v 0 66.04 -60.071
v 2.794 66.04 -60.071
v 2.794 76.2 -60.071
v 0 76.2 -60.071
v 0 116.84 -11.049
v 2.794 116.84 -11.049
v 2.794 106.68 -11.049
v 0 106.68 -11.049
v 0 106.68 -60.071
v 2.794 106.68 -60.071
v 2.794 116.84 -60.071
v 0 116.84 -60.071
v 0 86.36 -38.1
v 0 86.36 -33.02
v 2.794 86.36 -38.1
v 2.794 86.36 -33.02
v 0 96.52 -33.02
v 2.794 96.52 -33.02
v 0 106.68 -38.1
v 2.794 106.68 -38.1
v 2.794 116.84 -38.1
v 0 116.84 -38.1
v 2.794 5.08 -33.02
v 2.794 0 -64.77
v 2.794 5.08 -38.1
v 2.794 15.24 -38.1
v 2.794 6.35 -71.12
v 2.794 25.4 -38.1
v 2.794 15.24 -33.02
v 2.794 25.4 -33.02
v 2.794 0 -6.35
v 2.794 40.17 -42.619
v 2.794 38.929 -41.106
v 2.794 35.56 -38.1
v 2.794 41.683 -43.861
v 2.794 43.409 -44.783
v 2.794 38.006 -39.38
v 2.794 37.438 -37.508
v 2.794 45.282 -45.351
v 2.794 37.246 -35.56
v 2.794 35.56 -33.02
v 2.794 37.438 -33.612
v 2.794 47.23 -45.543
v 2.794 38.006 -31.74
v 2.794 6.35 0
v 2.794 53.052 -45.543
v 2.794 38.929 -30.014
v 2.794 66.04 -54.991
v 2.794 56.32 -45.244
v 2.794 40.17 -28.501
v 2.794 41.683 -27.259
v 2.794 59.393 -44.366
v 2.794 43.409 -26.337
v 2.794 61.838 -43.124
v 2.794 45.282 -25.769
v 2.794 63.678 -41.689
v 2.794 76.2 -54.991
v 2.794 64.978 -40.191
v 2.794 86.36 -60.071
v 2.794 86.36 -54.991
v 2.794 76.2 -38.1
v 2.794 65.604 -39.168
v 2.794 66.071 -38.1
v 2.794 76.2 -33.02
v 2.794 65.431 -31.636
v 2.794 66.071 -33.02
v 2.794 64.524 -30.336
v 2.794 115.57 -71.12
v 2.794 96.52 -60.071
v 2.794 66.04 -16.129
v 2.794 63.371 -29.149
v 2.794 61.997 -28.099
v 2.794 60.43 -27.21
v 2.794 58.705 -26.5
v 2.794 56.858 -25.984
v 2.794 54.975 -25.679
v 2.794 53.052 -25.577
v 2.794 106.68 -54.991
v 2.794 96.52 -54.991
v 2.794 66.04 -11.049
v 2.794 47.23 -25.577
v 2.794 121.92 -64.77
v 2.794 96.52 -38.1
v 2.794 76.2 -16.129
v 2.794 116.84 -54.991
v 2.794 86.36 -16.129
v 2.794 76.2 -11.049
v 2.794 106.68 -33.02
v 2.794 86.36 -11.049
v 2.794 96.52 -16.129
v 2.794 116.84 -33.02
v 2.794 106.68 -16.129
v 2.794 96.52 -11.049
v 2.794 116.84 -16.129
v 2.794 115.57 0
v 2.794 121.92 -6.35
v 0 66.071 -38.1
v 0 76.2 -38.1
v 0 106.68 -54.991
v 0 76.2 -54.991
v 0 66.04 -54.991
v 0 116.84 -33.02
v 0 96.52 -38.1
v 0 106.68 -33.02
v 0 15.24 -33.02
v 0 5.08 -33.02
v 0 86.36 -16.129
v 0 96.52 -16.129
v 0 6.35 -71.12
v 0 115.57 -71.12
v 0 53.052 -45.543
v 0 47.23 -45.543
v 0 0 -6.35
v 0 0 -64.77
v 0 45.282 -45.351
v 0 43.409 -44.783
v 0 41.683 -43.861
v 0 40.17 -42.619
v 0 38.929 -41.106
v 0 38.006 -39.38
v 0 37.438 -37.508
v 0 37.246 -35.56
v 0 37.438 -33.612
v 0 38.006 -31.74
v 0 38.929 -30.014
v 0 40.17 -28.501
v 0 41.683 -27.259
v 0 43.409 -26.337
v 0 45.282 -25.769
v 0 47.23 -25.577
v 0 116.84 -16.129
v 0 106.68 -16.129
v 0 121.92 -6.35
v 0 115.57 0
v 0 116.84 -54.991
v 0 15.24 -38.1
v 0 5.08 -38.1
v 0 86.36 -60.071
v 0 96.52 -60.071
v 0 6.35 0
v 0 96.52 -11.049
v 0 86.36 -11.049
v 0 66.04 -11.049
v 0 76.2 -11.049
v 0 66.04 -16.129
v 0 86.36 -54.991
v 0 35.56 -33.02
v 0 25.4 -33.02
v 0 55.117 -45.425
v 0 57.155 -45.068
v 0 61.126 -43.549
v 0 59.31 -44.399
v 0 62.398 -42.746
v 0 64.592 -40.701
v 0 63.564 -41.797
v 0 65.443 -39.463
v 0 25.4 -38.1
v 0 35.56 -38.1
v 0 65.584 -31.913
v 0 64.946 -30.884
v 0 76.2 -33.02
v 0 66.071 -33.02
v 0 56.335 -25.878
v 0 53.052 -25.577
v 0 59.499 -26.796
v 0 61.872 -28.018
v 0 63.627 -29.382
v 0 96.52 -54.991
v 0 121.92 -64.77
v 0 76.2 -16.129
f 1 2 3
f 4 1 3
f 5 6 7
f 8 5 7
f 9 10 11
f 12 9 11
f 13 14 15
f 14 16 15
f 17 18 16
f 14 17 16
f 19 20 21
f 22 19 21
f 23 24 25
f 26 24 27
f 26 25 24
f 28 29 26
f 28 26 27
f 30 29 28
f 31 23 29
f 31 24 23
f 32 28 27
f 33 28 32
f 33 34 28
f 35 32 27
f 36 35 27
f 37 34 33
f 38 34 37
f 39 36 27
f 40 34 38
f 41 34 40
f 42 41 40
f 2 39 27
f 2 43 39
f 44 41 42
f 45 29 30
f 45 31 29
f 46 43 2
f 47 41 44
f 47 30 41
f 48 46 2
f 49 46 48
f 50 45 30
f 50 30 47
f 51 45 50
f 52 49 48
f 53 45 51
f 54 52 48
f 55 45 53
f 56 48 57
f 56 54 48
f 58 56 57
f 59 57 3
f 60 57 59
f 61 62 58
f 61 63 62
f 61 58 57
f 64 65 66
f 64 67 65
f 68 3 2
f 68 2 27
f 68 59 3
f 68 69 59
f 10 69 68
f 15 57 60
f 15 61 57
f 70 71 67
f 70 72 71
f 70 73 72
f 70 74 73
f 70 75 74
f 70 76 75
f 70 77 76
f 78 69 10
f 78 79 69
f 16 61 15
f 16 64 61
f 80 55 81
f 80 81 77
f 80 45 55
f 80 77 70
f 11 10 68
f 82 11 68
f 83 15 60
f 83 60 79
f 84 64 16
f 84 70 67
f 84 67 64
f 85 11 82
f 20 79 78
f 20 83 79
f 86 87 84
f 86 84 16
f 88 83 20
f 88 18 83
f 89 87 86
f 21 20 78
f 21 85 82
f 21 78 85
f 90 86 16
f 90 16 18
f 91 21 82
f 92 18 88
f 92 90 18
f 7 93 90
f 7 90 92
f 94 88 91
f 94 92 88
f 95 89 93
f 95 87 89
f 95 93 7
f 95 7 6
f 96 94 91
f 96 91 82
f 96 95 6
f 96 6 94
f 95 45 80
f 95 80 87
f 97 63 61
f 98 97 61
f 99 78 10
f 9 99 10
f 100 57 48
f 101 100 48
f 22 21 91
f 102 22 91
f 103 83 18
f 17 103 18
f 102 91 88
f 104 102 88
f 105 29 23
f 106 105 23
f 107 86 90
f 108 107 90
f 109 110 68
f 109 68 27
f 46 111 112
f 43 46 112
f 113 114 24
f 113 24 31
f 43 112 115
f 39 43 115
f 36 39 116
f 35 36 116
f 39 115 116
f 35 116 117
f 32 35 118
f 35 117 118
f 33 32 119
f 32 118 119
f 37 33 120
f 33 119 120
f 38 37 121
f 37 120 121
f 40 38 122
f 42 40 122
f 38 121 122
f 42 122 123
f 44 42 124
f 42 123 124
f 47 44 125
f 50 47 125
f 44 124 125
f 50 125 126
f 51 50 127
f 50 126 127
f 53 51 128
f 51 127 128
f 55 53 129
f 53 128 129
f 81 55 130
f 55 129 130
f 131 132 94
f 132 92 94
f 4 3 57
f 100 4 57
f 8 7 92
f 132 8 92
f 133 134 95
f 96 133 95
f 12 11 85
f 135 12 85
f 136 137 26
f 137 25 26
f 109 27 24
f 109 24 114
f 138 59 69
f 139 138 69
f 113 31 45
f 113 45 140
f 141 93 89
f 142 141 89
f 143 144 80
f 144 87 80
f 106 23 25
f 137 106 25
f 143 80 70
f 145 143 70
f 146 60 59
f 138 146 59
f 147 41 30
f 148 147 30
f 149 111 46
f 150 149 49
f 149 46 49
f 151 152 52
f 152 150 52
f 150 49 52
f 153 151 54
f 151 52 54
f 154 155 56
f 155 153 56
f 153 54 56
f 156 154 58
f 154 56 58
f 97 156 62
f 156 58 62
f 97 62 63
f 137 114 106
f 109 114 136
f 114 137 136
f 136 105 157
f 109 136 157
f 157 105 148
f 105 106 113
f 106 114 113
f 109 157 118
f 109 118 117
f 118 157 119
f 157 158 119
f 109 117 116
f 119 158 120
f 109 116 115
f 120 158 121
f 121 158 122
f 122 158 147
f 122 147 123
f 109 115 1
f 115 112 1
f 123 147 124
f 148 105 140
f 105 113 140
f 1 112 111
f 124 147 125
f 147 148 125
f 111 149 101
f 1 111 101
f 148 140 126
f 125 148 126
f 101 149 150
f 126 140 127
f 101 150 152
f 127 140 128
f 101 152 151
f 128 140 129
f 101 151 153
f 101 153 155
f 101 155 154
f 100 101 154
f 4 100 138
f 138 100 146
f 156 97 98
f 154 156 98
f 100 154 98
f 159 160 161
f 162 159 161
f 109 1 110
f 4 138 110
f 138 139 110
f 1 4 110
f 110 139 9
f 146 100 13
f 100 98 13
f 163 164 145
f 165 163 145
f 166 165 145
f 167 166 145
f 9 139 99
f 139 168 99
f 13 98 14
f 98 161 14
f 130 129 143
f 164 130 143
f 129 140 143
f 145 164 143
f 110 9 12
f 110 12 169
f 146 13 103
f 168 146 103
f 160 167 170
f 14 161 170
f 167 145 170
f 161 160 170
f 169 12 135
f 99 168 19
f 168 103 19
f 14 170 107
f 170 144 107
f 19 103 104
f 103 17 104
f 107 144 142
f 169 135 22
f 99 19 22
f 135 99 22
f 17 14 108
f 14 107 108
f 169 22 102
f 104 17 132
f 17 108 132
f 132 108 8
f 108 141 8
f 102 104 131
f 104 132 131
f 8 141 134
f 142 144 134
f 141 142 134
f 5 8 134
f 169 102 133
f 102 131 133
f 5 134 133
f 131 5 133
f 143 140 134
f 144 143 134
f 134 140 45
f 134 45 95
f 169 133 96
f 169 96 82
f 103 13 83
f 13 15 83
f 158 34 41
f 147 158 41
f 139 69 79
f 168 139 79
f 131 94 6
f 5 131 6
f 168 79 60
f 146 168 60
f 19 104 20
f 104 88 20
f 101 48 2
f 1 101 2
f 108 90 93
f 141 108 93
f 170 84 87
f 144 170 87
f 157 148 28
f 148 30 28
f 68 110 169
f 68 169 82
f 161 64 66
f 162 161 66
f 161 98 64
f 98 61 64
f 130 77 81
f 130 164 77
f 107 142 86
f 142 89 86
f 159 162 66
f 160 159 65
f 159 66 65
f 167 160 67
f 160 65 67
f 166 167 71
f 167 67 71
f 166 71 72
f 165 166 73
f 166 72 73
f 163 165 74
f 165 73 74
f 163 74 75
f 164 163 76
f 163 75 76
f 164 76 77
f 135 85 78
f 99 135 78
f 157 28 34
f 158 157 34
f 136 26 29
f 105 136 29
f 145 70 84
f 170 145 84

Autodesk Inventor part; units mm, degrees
ref_plane "YZ Plane" through (0, 0, 0) normal (1, 0, 0) x (0, 1, 0)
ref_plane "XZ Plane" through (0, 0, 0) normal (0, 1, 0) x (-1, 0, 0)
ref_plane "XY Plane" through (0, 0, 0) normal (0, 0, 1) x (1, 0, 0)
sketch "Sketch1" plane through (0, 0, 0) normal (1, 0, 0) x (0, 1, 0)
  line L0 (0, 0) -> (121.92, 0)
  line L1 (121.92, 0) -> (121.92, -71.12)
  line L2 (121.92, -71.12) -> (0, -71.12)
  line L3 (0, -71.12) -> (0, 0)
  dimension "d0" = 121.92
  dimension "d1" = 71.12
extrude "Extrusion1" add sketch "Sketch1" along normal blind 2.794
sketch "Sketch2" plane through (2.794, 0, 0) normal (1, 0, 0) x (0, 0, -1)
  line L0 (0, 121.92) -> (0, 0) projected
  line L1 (0, 0) -> (71.12, 0) projected
  line L2 (71.12, 0) -> (71.12, 121.92) projected
  line L3 (71.12, 121.92) -> (0, 121.92) projected
  line L4 (71.12, 121.92) -> (0, 121.92) construction
  line L5 (35.56, 121.92) -> (35.56, 0) construction
  line L6 (33.02, 5.08) -> (38.1, 5.08)
  line L7 (38.1, 5.08) -> (38.1, 15.24)
  line L8 (38.1, 15.24) -> (33.02, 15.24)
  line L9 (33.02, 15.24) -> (33.02, 5.08)
  line L10 (33.02, 25.4) -> (38.1, 25.4)
  line L11 (38.1, 25.4) -> (38.1, 35.56)
  line L12 (38.1, 35.56) -> (33.02, 35.56)
  line L13 (33.02, 35.56) -> (33.02, 25.4)
  line L14 (33.02, 45.72) -> (38.1, 45.72)
  line L15 (38.1, 45.72) -> (38.1, 55.88)
  line L16 (38.1, 55.88) -> (33.02, 55.88)
  line L17 (33.02, 55.88) -> (33.02, 45.72)
  line L18 (33.02, 66.04) -> (38.1, 66.04)
  line L19 (38.1, 66.04) -> (38.1, 76.2)
  line L20 (38.1, 76.2) -> (33.02, 76.2)
  line L21 (33.02, 76.2) -> (33.02, 66.04)
  line L22 (33.02, 86.36) -> (38.1, 86.36)
  line L23 (38.1, 86.36) -> (38.1, 96.52)
  line L24 (38.1, 96.52) -> (33.02, 96.52)
  line L25 (33.02, 96.52) -> (33.02, 86.36)
  line L26 (33.02, 106.68) -> (38.1, 106.68)
  line L27 (38.1, 106.68) -> (38.1, 116.84)
  line L28 (38.1, 116.84) -> (33.02, 116.84)
  line L29 (33.02, 116.84) -> (33.02, 106.68)
  line L30 (11.049, 86.36) -> (16.129, 86.36)
  line L31 (16.129, 86.36) -> (16.129, 96.52)
  line L32 (11.049, 96.52) -> (11.049, 86.36)
  line L33 (16.129, 96.52) -> (11.049, 96.52)
  line L34 (11.049, 106.68) -> (16.129, 106.68)
  line L35 (11.049, 116.84) -> (11.049, 106.68)
  line L36 (16.129, 106.68) -> (16.129, 116.84)
  line L37 (16.129, 116.84) -> (11.049, 116.84)
  line L38 (11.049, 66.04) -> (16.129, 66.04)
  line L39 (11.049, 76.2) -> (11.049, 66.04)
  line L40 (16.129, 66.04) -> (16.129, 76.2)
  line L41 (16.129, 76.2) -> (11.049, 76.2)
  line L42 (54.991, 86.36) -> (60.071, 86.36)
  line L43 (60.071, 86.36) -> (60.071, 96.52)
  line L44 (54.991, 96.52) -> (54.991, 86.36)
  line L45 (60.071, 96.52) -> (54.991, 96.52)
  line L46 (54.991, 106.68) -> (60.071, 106.68)
  line L47 (54.991, 116.84) -> (54.991, 106.68)
  line L48 (60.071, 106.68) -> (60.071, 116.84)
  line L49 (60.071, 116.84) -> (54.991, 116.84)
  line L50 (54.991, 66.04) -> (60.071, 66.04)
  line L51 (54.991, 76.2) -> (54.991, 66.04)
  line L52 (60.071, 66.04) -> (60.071, 76.2)
  line L53 (60.071, 76.2) -> (54.991, 76.2)
  line L54 (33.02, 86.36) -> (38.1, 86.36)
  line L55 (38.1, 86.36) -> (38.1, 96.52)
  line L56 (33.02, 96.52) -> (33.02, 86.36)
  line L57 (38.1, 96.52) -> (33.02, 96.52)
  line L58 (33.02, 106.68) -> (38.1, 106.68)
  line L59 (33.02, 116.84) -> (33.02, 106.68)
  line L60 (38.1, 106.68) -> (38.1, 116.84)
  line L61 (38.1, 116.84) -> (33.02, 116.84)
  line L62 (33.02, 66.04) -> (38.1, 66.04)
  line L63 (33.02, 76.2) -> (33.02, 66.04)
  line L64 (38.1, 66.04) -> (38.1, 76.2)
  line L65 (38.1, 76.2) -> (33.02, 76.2)
  point P0 (35.56, 15.24)
  point P1 (35.56, 35.56)
  point P2 (35.56, 55.88)
  point P3 (35.56, 76.2)
  point P4 (35.56, 96.52)
  point P5 (35.56, 116.84)
  point P6 (13.589, 96.52)
  point P7 (13.589, 116.84)
  point P8 (13.589, 76.2)
  point P9 (57.531, 96.52)
  point P10 (57.531, 116.84)
  point P11 (57.531, 76.2)
  point P12 (35.56, 96.52)
  point P13 (35.56, 116.84)
  point P14 (35.56, 76.2)
  dimension "d4" = 5.08
  dimension "d5" = 10.16
  dimension "d6" = 5.08
  dimension "d9" = 20.32
  dimension "d18" = 21.971
  dimension "d21" = 21.971
extrude "Extrusion2" cut sketch "Sketch2" against normal blind 25.4 contours L3 L2 L1 L0 | L32 L33 L31 L30 | L35 L37 L36 L34 | L39 L41 L40 L38 | L44 L45 L43 L42 | L47 L49 L48 L46 | L51 L53 L52 L50 keep common part
extrude "Extrusion3" cut sketch "Sketch2" against normal blind 25.4 keep common part
sketch "Sketch3" plane through (2.794, 0, 0) normal (1, 0, 0) x (0, 0, -1)
  ellipse E0 centre (35.56, 53.0414) end of major axis (35.56, 41.2576) minor radius 8.332 (40.2212, 62.8087) -> (30.9261, 62.8347) ccw construction
  spline S0 degree 3 poles (30.9261, 62.8347) (30.9327, 62.8286) (30.9386, 62.8221) (30.9557, 62.8007) (30.9663, 62.7802) (30.977, 62.7425) (30.9787, 62.7187) (30.9751, 62.672) (30.9665, 62.6409) (30.9201, 62.5239) (30.844, 62.4329) (30.6139, 62.201) (30.3871, 62.0485) (30.1451, 61.9341) (30.1067, 61.9173) (30.0669, 61.9017) knots 0.147565 0.147565 0.147565 0.147565 0.150034 0.150034 0.1558 0.1558 0.161773 0.161773 0.169845 0.169845 0.199517 0.199517 0.267842 0.267842 0.279835 0.279835 0.279835 0.279835 construction
  ellipse E1 centre (35.56, 53.0414) end of major axis (35.56, 41.2576) minor radius 8.332 (30.0669, 61.9017) -> (27.23, 53.3005) ccw construction
  spline S1 degree 3 poles (27.23, 53.3005) (27.2588, 53.2719) (27.2851, 53.2407) (27.334, 53.1732) (27.3565, 53.1364) (27.3764, 53.0984) knots -0.025032 -0.025032 -0.025032 -0.025032 -0.012859 -0.012859 0 0 0 0 construction
  spline S2 degree 3 poles (27.3764, 53.0984) (27.3563, 53.0613) (27.3336, 53.0254) (27.2841, 52.9599) (27.2576, 52.9297) (27.2286, 52.9024) knots -0.024627 -0.024627 -0.024627 -0.024627 -0.011976 -0.011976 -0.000005 -0.000005 -0.000005 -0.000005 construction
  ellipse E2 centre (35.56, 53.0414) end of major axis (35.56, 41.2576) minor radius 8.332 (27.2286, 52.9024) -> (27.2377, 52.473) ccw construction
  spline S3 degree 3 poles (27.2377, 52.473) (27.2678, 52.4474) (27.2955, 52.4189) (27.3478, 52.3562) (27.372, 52.3217) (27.3937, 52.2857) knots -0.024476 -0.024476 -0.024476 -0.024476 -0.012604 -0.012604 0 0 0 0 construction
  spline S4 degree 3 poles (27.3937, 52.2857) (27.3755, 52.2465) (27.3546, 52.2085) (27.3086, 52.1382) (27.2836, 52.1055) (27.256, 52.0754) knots -0.025198 -0.025198 -0.025198 -0.025198 -0.012267 -0.012267 -0.000005 -0.000005 -0.000005 -0.000005 construction
  ellipse E3 centre (35.56, 53.0414) end of major axis (35.56, 41.2576) minor radius 8.332 (27.256, 52.0754) -> (39.4571, 42.626) ccw construction
  spline S5 degree 3 poles (39.4571, 42.626) (39.4604, 42.6731) (39.4664, 42.7203) (39.4838, 42.8124) (39.4952, 42.8577) (39.5094, 42.902) knots -0.028123 -0.028123 -0.028123 -0.028123 -0.013949 -0.013949 0 0 0 0 construction
  spline S6 degree 3 poles (39.5094, 42.902) (39.5437, 42.8955) (39.577, 42.8851) (39.6424, 42.8569) (39.674, 42.839) (39.7037, 42.8182) knots -0.021367 -0.021367 -0.021367 -0.021367 -0.01089 -0.01089 -0.00001 -0.00001 -0.00001 -0.00001 construction
  ellipse E4 centre (35.56, 53.0414) end of major axis (35.56, 41.2576) minor radius 8.332 (39.7037, 42.8182) -> (39.9645, 43.0386) ccw construction
  spline S7 degree 3 poles (39.9645, 43.0386) (39.9654, 43.0862) (39.9691, 43.1338) (39.9819, 43.2275) (39.991, 43.274) (40.0029, 43.3195) knots -0.02838 -0.02838 -0.02838 -0.02838 -0.014121 -0.014121 0 0 0 0 construction
  spline S8 degree 3 poles (40.0029, 43.3195) (40.0373, 43.3164) (40.0711, 43.3093) (40.1378, 43.2875) (40.1703, 43.2728) (40.2011, 43.2549) knots -0.021052 -0.021052 -0.021052 -0.021052 -0.010689 -0.010689 -0.000009 -0.000009 -0.000009 -0.000009 construction
  ellipse E5 centre (35.56, 53.0414) end of major axis (35.56, 41.2576) minor radius 8.332 (40.2011, 43.2549) -> (41.1095, 61.8311) ccw construction
  spline S9 degree 3 poles (41.1095, 61.8311) (41.0496, 61.8526) (40.9919, 61.8776) (40.734, 62.0024) (40.5086, 62.1569) (40.2806, 62.3908) (40.2052, 62.4825) (40.1599, 62.5999) (40.1516, 62.6311) (40.1484, 62.6778) (40.1503, 62.7016) (40.1613, 62.7392) (40.1721, 62.7596) (40.1941, 62.7867) (40.2073, 62.7989) (40.2212, 62.8087) knots 0.103426 0.103426 0.103426 0.103426 0.121046 0.121046 0.189371 0.189371 0.219043 0.219043 0.227115 0.227115 0.233088 0.233088 0.238854 0.238854 0.243583 0.243583 0.243583 0.243583 construction
  ellipse E6 centre (35.56, 53.0524) end of major axis (35.56, 40.1371) minor radius 9.1321 construction
  ellipse E7 centre (35.56, 52.9268) end of major axis (35.56, 42.9637) minor radius 7.045 (39.5734, 61.1151) -> (37.2879, 62.5856) ccw construction
  line L0 (37.2879, 62.5856) -> (37.0953, 61.1151) construction
  line L1 (37.0953, 61.1151) -> (39.5734, 61.1151) construction
  line L2 (29.0123, 59.6726) -> (28.7127, 59.6726) construction
  ellipse E8 centre (35.56, 52.9268) end of major axis (35.56, 41.1252) minor radius 8.345 (42.4073, 59.6726) -> (28.7127, 59.6726) ccw construction
  line L3 (42.4073, 59.6726) -> (42.1077, 59.6726) construction
  ellipse E9 centre (35.56, 52.9268) end of major axis (35.56, 64.3833) minor radius 8.101 (42.4504, 58.9514) -> (42.1077, 59.6726) ccw construction
  line L4 (42.4504, 58.9514) -> (36.9155, 58.9514) construction
  line L5 (36.9155, 58.9514) -> (37.0257, 59.6726) construction
  line L6 (37.0257, 59.6726) -> (36.1561, 59.6726) construction
  line L7 (36.1561, 59.6726) -> (36.0459, 58.9514) construction
  line L8 (36.0459, 58.9514) -> (33.4082, 58.9514) construction
  line L9 (33.4082, 58.9514) -> (33.9116, 57.9159) construction
  line L10 (33.9116, 57.9159) -> (33.2456, 57.2685) construction
  line L11 (33.2456, 57.2685) -> (32.7453, 57.1196) construction
  line L12 (32.7453, 57.1196) -> (31.855, 58.9514) construction
  line L13 (31.855, 58.9514) -> (28.6696, 58.9514) construction
  ellipse E10 centre (35.56, 52.9268) end of major axis (35.56, 64.3833) minor radius 8.101 (29.0123, 59.6726) -> (28.6696, 58.9514) ccw construction
  line L14 (32.132, 61.1151) -> (36.1698, 61.1151) construction
  line L15 (36.1698, 61.1151) -> (36.3931, 62.82) construction
  ellipse E11 centre (35.56, 52.9268) end of major axis (35.56, 42.9637) minor radius 7.045 (36.3931, 62.82) -> (31.9524, 61.4845) ccw construction
  line L16 (31.9524, 61.4845) -> (32.132, 61.1151) construction
  line L17 (38.6371, 57.0165) -> (40.2416, 58.5764) construction
  line L18 (40.2416, 58.5764) -> (40.9667, 57.0846) construction
  line L19 (40.9667, 57.0846) -> (40.1513, 56.2919) construction
  line L20 (40.1513, 56.2919) -> (38.6371, 57.0165) construction
  line L21 (38.6371, 57.0165) -> (40.1513, 56.2919) construction
  line L22 (40.1513, 56.2919) -> (40.9667, 57.0846) construction
  line L23 (40.9667, 57.0846) -> (40.7011, 57.631) construction
  line L24 (40.7011, 57.631) -> (41.0218, 57.631) construction
  ellipse E12 centre (35.56, 52.9268) end of major axis (35.56, 43.8829) minor radius 6.395 (30.0982, 57.631) -> (41.0218, 57.631) ccw construction
  line L25 (30.0982, 57.631) -> (32.4968, 57.631) construction
  line L26 (32.4968, 57.631) -> (32.7453, 57.1196) construction
  line L27 (32.7453, 57.1196) -> (33.2456, 57.2685) construction
  line L28 (33.2456, 57.2685) -> (33.6185, 57.631) construction
  line L29 (33.6185, 57.631) -> (39.2691, 57.631) construction
  line L30 (39.2691, 57.631) -> (38.6371, 57.0165) construction
  ellipse E13 centre (35.56, 53.0524) end of major axis (35.56, 39.5904) minor radius 9.983
  point P0 (0, 0)
  dimension "d26" = 13.462
extrude "Extrusion4" cut sketch "Sketch3" against normal blind 25.4
sketch "Sketch4" plane through (0, 0, 0) normal (-1, 0, 0) x (0, 0, 1)
  point P0 (0, 0)
sketch "Sketch5" plane through (0, 0, 0) normal (-1, 0, 0) x (0, 0, 1)
  ellipse E0 centre (-35.56, 53.0524) end of major axis (-35.56, 66.5144) minor radius 9.983 (-38.1, 66.0713) -> (-33.02, 66.0713) ccw projected
  line L0 (-38.1, 76.2) -> (-38.1, 66.0713) projected
  line L1 (-33.02, 76.2) -> (-38.1, 76.2) projected
  line L2 (-33.02, 66.0713) -> (-33.02, 76.2) projected
  line L3 (-60.071, 76.2) -> (-60.071, 66.04) projected
  line L4 (-54.991, 76.2) -> (-60.071, 76.2) projected
  line L5 (-54.991, 66.04) -> (-54.991, 76.2) projected
  line L6 (-60.071, 66.04) -> (-54.991, 66.04) projected
  line L7 (-60.071, 116.84) -> (-60.071, 106.68) projected
  line L8 (-54.991, 116.84) -> (-60.071, 116.84) projected
  line L9 (-54.991, 106.68) -> (-54.991, 116.84) projected
  line L10 (-60.071, 106.68) -> (-54.991, 106.68) projected
  line L11 (-60.071, 96.52) -> (-60.071, 86.36) projected
  line L12 (-54.991, 96.52) -> (-60.071, 96.52) projected
  line L13 (-54.991, 86.36) -> (-54.991, 96.52) projected
  line L14 (-60.071, 86.36) -> (-54.991, 86.36) projected
  line L15 (-16.129, 76.2) -> (-16.129, 66.04) projected
  line L16 (-11.049, 76.2) -> (-16.129, 76.2) projected
  line L17 (-11.049, 66.04) -> (-11.049, 76.2) projected
  line L18 (-16.129, 66.04) -> (-11.049, 66.04) projected
  line L19 (-16.129, 116.84) -> (-16.129, 106.68) projected
  line L20 (-11.049, 116.84) -> (-16.129, 116.84) projected
  line L21 (-11.049, 106.68) -> (-11.049, 116.84) projected
  line L22 (-16.129, 106.68) -> (-11.049, 106.68) projected
  line L23 (-16.129, 96.52) -> (-16.129, 86.36) projected
  line L24 (-11.049, 96.52) -> (-16.129, 96.52) projected
  line L25 (-11.049, 86.36) -> (-11.049, 96.52) projected
  line L26 (-16.129, 86.36) -> (-11.049, 86.36) projected
  line L27 (-38.1, 116.84) -> (-38.1, 106.68) projected
  line L28 (-33.02, 116.84) -> (-38.1, 116.84) projected
  line L29 (-33.02, 106.68) -> (-33.02, 116.84) projected
  line L30 (-38.1, 106.68) -> (-33.02, 106.68) projected
  line L31 (-38.1, 96.52) -> (-38.1, 86.36) projected
  line L32 (-33.02, 96.52) -> (-38.1, 96.52) projected
  line L33 (-33.02, 86.36) -> (-33.02, 96.52) projected
  line L34 (-38.1, 86.36) -> (-33.02, 86.36) projected
  line L35 (-38.1, 35.56) -> (-38.1, 25.4) projected
  line L36 (-33.02, 35.56) -> (-38.1, 35.56) projected
  line L37 (-33.02, 25.4) -> (-33.02, 35.56) projected
  line L38 (-38.1, 25.4) -> (-33.02, 25.4) projected
  line L39 (-38.1, 15.24) -> (-38.1, 5.08) projected
  line L40 (-33.02, 15.24) -> (-38.1, 15.24) projected
  line L41 (-33.02, 5.08) -> (-33.02, 15.24) projected
  line L42 (-38.1, 5.08) -> (-33.02, 5.08) projected
  line L43 (0, 0) -> (0, 121.92) projected
  line L44 (0, 121.92) -> (-71.12, 121.92) projected
  line L45 (-71.12, 121.92) -> (-71.12, 0) projected
  line L46 (-71.12, 0) -> (0, 0) projected
  line L47 (-25.577, 53.0524) -> (-25.577, 47.2295)
  ellipse E1 centre (-35.56, 53.0524) end of major axis (-35.56, 66.5144) minor radius 9.983 (-38.1, 66.0713) -> (-33.02, 66.0713) ccw projected
  line L48 (-45.543, 53.0524) -> (-45.543, 47.2295)
  line L49 (-45.543, 47.2295) -> (-25.577, 47.2295) construction
  arc A0 (-45.543, 47.2295) -> (-25.577, 47.2295) centre (-35.56, 47.2295) ccw
  line L50 (-25.577, 53.0524) -> (-45.543, 53.0524)
extrude "Extrusion5" cut sketch "Sketch5" against normal blind 25.4 contours L50 E0 | E0 L47 A0 L48
chamfer "Chamfer1" distance 6.35 angle 45 4 edges at (1.397, 121.92, -71.12) (1.397, 121.92, 0) (1.397, 0, 0) (1.397, 0, -71.12)
equation "\"d9\" = 2 * d5"
properties part number "Sleigh" material "Polycarbonate, Smoke"
